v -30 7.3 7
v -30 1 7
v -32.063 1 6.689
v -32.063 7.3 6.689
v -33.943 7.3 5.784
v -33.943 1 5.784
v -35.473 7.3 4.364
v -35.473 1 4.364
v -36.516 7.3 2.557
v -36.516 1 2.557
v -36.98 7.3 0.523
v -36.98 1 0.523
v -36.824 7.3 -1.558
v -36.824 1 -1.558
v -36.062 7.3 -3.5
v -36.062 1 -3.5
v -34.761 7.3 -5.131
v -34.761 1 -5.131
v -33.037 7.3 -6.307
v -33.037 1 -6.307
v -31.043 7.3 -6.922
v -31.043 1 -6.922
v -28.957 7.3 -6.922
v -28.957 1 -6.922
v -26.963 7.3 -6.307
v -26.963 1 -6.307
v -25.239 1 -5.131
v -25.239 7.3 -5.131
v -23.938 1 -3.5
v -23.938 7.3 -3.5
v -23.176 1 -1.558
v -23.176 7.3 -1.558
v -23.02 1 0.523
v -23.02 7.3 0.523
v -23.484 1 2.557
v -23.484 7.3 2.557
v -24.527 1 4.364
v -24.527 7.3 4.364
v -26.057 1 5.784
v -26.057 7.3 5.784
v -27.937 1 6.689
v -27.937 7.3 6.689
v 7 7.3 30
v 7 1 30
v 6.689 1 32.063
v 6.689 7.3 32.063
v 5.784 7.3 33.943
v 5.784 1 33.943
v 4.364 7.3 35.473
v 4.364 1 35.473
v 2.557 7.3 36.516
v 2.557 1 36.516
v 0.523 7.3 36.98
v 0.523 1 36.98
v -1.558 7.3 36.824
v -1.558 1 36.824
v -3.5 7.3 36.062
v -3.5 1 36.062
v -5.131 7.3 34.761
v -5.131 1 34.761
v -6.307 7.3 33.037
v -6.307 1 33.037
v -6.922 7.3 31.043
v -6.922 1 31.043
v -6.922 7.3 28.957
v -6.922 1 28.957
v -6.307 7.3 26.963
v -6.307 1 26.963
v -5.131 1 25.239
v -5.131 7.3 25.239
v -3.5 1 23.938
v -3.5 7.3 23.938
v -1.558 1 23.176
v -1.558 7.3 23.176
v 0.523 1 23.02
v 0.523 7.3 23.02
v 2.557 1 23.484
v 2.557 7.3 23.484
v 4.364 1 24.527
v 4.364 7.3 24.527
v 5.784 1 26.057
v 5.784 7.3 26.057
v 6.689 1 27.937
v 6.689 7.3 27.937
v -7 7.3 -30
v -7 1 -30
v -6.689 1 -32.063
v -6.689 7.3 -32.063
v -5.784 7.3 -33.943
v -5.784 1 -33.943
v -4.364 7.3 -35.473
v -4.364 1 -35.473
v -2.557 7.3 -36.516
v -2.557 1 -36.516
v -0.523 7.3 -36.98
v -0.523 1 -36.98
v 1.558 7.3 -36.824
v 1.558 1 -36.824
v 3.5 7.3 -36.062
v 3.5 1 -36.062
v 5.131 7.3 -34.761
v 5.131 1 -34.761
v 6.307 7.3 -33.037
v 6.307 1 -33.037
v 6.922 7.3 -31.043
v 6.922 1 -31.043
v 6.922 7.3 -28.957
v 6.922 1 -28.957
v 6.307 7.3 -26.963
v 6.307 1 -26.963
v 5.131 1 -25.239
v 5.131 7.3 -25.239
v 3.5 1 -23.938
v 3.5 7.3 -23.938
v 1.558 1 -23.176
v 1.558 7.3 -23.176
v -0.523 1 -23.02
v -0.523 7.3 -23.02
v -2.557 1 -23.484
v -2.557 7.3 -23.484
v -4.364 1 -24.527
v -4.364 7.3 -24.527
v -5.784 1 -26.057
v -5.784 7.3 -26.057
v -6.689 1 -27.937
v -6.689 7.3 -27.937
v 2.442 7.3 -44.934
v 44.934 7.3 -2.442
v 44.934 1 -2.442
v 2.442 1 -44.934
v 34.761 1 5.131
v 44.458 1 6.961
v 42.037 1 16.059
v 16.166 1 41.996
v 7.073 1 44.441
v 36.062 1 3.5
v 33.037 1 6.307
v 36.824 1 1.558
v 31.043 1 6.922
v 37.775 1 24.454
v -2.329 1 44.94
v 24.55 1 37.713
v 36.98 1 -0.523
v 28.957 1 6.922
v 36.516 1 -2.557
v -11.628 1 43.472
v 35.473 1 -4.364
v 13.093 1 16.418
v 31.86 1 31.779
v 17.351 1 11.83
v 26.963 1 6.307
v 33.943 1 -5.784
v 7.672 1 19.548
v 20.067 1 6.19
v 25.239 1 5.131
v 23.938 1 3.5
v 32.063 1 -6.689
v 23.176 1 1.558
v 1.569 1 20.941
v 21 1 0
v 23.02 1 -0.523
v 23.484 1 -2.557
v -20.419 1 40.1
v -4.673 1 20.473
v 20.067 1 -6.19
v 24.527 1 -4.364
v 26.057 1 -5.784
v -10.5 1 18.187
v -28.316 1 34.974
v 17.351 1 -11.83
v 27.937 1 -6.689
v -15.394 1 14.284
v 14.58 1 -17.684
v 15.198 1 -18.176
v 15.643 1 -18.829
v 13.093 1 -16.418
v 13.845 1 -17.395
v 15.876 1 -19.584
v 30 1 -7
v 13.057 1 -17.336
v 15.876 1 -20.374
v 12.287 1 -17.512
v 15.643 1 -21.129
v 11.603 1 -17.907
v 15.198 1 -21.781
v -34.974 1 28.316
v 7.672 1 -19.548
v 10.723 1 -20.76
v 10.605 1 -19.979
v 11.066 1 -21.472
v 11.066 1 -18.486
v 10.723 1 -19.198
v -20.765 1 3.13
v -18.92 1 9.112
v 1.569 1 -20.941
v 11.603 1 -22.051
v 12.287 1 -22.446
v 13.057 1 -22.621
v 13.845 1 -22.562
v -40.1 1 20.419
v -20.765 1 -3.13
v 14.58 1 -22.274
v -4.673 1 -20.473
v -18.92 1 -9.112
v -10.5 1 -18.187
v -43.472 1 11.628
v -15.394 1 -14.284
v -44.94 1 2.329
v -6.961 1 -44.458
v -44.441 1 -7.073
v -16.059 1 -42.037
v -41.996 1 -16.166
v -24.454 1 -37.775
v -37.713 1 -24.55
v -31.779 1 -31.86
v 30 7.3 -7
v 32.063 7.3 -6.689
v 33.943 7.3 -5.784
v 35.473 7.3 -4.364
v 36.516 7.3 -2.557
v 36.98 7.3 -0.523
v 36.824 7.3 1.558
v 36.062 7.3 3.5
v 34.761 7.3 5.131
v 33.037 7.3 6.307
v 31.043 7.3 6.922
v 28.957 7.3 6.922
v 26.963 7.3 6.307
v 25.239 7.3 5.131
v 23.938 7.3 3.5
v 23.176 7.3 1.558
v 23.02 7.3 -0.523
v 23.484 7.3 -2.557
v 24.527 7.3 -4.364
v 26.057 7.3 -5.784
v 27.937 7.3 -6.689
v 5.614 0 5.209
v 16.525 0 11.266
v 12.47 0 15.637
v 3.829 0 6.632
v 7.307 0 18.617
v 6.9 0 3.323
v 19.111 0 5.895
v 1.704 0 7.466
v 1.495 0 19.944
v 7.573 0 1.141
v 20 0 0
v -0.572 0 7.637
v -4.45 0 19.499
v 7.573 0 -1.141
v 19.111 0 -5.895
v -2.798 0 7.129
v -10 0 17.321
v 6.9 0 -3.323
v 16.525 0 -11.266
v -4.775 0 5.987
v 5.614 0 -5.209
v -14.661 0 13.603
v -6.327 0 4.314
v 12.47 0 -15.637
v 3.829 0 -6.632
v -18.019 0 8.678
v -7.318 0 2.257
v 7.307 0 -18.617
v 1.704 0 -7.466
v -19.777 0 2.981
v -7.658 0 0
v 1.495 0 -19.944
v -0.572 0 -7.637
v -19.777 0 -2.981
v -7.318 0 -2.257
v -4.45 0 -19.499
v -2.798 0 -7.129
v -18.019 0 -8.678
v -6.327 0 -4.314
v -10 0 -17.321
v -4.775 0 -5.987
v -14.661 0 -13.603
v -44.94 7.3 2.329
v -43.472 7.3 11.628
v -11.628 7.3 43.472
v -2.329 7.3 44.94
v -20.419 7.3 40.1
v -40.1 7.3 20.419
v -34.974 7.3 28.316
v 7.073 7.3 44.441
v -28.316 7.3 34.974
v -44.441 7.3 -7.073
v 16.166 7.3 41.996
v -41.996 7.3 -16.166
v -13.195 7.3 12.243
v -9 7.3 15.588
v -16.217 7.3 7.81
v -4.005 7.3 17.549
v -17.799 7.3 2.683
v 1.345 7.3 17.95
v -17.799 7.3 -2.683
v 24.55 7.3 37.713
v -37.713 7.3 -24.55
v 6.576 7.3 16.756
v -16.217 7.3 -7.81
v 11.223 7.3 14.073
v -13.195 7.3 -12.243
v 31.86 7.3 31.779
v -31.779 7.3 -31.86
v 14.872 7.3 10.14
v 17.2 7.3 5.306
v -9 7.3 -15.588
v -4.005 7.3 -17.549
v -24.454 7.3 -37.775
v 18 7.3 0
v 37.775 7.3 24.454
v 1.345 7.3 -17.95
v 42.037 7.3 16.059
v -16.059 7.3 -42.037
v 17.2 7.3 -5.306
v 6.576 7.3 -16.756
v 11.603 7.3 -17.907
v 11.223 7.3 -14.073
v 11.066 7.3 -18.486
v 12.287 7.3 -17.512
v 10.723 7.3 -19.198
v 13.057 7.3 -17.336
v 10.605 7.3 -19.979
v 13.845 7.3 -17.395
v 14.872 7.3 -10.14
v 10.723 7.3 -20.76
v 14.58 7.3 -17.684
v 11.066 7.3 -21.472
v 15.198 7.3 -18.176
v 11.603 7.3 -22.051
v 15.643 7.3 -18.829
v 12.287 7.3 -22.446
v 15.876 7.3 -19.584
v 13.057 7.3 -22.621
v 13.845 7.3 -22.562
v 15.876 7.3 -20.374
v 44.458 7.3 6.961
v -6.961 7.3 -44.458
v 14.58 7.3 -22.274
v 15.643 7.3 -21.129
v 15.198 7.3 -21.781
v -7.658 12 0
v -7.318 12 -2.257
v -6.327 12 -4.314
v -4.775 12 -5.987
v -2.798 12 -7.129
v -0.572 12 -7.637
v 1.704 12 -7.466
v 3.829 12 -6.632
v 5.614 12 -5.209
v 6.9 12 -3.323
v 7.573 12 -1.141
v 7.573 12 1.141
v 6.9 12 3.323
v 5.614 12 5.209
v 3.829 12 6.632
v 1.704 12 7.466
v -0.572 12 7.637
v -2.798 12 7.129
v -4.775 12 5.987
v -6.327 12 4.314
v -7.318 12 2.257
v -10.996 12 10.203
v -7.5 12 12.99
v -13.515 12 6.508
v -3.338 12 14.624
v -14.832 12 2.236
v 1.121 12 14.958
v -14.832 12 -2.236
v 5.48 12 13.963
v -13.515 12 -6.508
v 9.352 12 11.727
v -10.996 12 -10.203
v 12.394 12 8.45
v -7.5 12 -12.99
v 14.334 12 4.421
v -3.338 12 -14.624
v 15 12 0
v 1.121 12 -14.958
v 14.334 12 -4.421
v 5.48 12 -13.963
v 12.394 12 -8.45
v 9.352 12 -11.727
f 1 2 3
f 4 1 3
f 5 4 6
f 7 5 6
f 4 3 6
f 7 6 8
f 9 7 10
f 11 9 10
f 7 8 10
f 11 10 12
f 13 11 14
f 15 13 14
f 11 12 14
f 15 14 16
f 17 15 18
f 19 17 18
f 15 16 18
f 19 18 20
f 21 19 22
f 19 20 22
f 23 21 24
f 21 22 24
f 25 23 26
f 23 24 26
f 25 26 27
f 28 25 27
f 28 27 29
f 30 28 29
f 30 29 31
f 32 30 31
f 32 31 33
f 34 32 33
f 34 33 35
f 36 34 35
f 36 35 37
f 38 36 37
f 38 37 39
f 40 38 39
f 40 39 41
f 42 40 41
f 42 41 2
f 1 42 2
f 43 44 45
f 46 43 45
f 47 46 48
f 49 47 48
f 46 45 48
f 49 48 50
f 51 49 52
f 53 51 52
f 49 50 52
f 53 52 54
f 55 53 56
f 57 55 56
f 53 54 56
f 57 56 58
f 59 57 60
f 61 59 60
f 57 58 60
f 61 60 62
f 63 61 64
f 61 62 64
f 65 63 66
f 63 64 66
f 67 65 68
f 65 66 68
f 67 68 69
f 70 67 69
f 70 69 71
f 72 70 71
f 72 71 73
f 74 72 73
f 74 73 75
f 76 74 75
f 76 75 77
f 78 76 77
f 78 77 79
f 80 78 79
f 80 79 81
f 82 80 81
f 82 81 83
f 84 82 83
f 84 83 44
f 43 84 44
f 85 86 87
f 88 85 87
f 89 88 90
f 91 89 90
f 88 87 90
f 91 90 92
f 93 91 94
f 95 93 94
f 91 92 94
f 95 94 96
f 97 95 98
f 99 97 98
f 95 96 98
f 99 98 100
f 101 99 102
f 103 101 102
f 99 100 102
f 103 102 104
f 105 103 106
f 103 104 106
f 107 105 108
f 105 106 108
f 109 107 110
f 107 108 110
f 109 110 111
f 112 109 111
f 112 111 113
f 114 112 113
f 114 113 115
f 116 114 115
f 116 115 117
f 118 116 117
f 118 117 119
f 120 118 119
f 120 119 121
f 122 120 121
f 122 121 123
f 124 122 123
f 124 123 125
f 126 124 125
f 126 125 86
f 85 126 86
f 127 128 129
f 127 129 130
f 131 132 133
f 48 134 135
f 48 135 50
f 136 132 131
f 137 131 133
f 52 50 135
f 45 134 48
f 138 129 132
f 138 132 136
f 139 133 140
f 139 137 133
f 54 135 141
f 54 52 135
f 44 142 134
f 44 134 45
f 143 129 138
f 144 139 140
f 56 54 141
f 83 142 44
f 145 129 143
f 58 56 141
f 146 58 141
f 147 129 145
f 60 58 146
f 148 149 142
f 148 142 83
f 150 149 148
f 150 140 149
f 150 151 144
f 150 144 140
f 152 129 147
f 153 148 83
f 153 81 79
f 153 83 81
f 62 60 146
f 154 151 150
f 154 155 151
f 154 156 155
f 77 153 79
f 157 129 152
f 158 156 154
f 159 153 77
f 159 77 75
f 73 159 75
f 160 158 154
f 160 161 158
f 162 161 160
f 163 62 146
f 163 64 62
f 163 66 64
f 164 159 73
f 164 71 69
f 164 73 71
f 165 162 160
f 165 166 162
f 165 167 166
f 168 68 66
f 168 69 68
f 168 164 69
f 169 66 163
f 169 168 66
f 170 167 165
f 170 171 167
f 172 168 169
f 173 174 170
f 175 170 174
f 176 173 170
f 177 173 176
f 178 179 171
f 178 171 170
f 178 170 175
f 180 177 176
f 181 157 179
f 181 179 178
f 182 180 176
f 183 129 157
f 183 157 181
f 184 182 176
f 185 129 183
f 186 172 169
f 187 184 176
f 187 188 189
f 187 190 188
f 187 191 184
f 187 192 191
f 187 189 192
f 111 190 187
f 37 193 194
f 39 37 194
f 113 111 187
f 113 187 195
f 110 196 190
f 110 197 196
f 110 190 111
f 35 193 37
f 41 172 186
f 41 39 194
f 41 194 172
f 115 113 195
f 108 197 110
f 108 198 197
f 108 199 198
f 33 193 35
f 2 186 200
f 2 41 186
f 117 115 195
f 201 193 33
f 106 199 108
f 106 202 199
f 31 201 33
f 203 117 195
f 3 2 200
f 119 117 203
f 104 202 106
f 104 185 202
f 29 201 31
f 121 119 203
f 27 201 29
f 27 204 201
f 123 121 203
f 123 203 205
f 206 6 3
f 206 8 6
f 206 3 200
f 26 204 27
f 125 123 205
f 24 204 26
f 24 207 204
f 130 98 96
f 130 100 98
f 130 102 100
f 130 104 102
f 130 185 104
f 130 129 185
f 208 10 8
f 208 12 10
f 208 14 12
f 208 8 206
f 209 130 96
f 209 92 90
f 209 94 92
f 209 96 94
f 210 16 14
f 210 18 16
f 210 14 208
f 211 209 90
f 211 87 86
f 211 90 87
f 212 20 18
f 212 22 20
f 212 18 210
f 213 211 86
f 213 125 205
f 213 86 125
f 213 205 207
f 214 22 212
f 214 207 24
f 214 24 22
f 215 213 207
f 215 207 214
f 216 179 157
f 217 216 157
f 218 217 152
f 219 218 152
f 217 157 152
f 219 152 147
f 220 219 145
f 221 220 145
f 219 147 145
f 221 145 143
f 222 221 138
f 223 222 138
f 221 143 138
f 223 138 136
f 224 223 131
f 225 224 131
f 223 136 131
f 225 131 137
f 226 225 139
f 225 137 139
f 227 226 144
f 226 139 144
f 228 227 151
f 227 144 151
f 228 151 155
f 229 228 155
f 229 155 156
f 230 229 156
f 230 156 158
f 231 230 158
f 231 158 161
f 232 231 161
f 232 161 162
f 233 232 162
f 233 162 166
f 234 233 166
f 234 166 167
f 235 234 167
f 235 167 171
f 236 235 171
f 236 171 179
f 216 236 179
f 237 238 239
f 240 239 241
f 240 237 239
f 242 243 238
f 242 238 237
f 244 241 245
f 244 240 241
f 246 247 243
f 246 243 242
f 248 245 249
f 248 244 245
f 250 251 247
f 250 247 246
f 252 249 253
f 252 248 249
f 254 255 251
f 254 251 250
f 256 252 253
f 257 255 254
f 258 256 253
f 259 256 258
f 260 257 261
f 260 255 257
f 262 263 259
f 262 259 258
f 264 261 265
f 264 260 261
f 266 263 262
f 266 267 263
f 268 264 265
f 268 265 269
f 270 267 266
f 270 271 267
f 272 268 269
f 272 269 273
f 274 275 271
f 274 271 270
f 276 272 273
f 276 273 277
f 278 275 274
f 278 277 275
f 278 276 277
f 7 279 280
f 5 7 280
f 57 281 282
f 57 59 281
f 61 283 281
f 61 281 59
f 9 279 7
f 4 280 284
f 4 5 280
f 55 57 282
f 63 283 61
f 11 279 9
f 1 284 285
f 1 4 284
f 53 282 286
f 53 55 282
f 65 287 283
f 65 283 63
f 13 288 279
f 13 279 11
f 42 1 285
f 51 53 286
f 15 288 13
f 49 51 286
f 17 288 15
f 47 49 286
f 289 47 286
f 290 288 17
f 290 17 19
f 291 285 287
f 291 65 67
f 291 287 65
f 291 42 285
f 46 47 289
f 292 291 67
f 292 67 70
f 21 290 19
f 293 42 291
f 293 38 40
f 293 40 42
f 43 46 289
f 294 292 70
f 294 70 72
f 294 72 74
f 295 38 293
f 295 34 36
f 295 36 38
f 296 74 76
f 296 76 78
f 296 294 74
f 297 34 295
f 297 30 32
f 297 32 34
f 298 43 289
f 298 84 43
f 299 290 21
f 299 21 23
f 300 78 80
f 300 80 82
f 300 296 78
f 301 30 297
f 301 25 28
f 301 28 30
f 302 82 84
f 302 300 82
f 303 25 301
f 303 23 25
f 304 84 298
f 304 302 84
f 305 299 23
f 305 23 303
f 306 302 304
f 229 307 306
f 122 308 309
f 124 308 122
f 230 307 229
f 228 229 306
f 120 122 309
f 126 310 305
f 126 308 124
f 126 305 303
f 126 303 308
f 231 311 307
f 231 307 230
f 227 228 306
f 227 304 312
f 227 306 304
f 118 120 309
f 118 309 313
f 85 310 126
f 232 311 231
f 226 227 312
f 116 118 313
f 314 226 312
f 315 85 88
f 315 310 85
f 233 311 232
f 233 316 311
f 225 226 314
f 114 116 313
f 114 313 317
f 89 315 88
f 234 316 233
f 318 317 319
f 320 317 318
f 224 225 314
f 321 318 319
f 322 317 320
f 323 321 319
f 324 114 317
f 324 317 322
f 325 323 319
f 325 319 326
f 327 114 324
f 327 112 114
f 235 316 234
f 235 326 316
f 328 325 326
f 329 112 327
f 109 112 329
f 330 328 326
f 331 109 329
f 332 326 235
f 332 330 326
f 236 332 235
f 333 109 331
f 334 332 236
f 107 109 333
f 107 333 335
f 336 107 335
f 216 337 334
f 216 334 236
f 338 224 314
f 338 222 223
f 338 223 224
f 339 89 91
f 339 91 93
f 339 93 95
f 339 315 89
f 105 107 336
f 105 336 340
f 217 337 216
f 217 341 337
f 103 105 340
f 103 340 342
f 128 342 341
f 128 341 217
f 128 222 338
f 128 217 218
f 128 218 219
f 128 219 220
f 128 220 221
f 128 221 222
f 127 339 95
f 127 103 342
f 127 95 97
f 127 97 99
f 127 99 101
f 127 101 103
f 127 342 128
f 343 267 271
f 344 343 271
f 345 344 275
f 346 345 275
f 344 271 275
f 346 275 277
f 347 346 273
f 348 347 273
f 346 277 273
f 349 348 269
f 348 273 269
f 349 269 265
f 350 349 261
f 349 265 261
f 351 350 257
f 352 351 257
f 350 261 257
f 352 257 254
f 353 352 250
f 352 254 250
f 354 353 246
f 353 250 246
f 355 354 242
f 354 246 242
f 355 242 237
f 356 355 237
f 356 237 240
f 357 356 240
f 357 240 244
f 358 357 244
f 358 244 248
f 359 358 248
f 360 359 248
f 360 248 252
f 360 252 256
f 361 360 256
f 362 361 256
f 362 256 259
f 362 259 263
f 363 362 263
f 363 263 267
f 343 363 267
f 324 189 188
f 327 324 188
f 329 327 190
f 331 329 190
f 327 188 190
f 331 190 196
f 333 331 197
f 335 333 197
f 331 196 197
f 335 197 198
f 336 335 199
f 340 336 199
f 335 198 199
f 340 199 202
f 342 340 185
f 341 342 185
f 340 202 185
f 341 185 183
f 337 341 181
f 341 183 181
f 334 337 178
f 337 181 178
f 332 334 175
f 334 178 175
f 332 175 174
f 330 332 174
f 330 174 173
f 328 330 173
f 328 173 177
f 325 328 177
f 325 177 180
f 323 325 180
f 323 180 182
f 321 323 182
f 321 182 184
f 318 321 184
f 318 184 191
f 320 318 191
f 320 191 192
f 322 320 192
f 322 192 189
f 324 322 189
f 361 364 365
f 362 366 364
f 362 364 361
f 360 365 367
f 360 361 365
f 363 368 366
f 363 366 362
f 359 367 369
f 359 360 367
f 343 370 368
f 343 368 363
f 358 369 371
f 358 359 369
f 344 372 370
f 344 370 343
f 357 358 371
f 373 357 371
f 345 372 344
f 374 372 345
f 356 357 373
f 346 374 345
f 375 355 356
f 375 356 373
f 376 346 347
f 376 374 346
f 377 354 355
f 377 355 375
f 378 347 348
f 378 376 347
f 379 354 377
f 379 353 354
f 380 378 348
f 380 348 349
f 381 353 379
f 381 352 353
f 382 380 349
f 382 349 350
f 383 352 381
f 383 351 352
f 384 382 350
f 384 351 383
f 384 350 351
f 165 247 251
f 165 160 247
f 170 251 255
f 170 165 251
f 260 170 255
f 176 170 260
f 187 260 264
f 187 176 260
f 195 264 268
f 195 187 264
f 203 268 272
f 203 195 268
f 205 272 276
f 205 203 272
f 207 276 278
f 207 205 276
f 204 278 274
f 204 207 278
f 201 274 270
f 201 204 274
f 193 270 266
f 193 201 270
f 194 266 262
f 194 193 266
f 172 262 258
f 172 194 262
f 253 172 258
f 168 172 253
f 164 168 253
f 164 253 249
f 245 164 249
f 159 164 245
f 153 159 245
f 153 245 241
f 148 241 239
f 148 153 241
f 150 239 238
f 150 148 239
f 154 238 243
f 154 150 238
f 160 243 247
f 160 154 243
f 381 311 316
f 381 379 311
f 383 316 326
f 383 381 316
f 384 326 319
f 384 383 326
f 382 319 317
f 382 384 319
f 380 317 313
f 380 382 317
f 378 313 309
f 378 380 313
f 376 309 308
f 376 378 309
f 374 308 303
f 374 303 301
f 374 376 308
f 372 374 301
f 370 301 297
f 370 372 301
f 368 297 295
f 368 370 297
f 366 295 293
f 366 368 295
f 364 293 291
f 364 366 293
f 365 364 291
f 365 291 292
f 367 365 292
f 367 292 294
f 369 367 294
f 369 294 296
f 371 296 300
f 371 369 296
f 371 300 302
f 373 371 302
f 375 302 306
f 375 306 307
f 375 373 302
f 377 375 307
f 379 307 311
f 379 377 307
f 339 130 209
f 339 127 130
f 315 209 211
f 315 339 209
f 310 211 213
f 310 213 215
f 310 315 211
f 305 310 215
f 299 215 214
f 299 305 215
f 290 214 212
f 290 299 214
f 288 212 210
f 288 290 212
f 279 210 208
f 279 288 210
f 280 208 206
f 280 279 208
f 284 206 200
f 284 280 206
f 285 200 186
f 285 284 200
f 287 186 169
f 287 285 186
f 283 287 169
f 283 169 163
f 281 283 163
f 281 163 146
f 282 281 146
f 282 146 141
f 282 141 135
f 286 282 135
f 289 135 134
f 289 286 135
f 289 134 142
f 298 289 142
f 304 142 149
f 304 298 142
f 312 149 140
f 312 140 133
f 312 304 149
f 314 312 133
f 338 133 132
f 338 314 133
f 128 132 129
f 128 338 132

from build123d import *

# Parameters (mm, degrees)
F_14_0_14_DURCHMESSER_BOHRUNG2_D = 14
KREISMUSTER2_COUNT               = 4
F_3_8_18_NPSM_GEWINDEBOHRUNG1_D  = 15.3162
SCHNITT_LINEAR_AUSTRAGEN1_DEPTH  = 6.3
F_5_3_5_3_DURCHMESSER_BOHRUNG1_D = 5.3


with BuildPart() as part:
    # Skizze1 → Rotation1 (revolve)
    with BuildSketch(Plane.XY):
        Polygon((15, 12), (0, 12), (0, 0), (20, 0), (21, 1), (45, 1), (45, 7.3), (18, 7.3), align=None)
    revolve(axis=Axis((0, 0, 0), (0, 1, 0)))

    # Ø14.0 (14) Durchmesser Bohrung2 (through all)
    with Locations(Plane(origin=(0, 7.3, 0), x_dir=(1, 0, 0), z_dir=(0, 1, 0))):
        with Locations((0, 30)):
            f_14_0_14_durchmesser_bohrung2 = Hole(F_14_0_14_DURCHMESSER_BOHRUNG2_D / 2)

    # Kreismuster2: Ø14.0 (14) Durchmesser Bohrung2 ×4 about axis
    kreismuster2_axis = Axis((0, 0, 0), (0, 1, 0))
    for i in range(1, KREISMUSTER2_COUNT):
        add(f_14_0_14_durchmesser_bohrung2.rotate(kreismuster2_axis, i * 360 / KREISMUSTER2_COUNT), mode=Mode.SUBTRACT)

    # 3/8-18 NPSM Gewindebohrung1 (through all)
    with Locations(Plane(origin=(0, 12, 0), x_dir=(1, 0, 0), z_dir=(0, 1, 0))):
        with Locations((0, 0)):
            Hole(F_3_8_18_NPSM_GEWINDEBOHRUNG1_D / 2)

    # Skizze16 → Schnitt-Linear austragen1 (cut)
    with BuildSketch(Plane(origin=(0, 7.3, 0), x_dir=(1, 0, 0), z_dir=(0, 1, 0))):
        with BuildLine():
            Line((44.933664947, 2.442489393), (2.442489393, 44.933664947))
            ThreePointArc((2.442489393, 44.933664947), (31.819805153, 31.819805153), (44.933664947, 2.442489393))
        make_face()
    extrude(amount=-SCHNITT_LINEAR_AUSTRAGEN1_DEPTH, mode=Mode.SUBTRACT)

    # Ø5.3 (5.3) Durchmesser Bohrung1 (through all)
    with Locations(Plane(origin=(0, 7.3, 0), x_dir=(1, 0, 0), z_dir=(0, 1, 0))):
        with Locations((13.25528115, 19.978737566)):
            Hole(F_5_3_5_3_DURCHMESSER_BOHRUNG1_D / 2)


solid = part.part
